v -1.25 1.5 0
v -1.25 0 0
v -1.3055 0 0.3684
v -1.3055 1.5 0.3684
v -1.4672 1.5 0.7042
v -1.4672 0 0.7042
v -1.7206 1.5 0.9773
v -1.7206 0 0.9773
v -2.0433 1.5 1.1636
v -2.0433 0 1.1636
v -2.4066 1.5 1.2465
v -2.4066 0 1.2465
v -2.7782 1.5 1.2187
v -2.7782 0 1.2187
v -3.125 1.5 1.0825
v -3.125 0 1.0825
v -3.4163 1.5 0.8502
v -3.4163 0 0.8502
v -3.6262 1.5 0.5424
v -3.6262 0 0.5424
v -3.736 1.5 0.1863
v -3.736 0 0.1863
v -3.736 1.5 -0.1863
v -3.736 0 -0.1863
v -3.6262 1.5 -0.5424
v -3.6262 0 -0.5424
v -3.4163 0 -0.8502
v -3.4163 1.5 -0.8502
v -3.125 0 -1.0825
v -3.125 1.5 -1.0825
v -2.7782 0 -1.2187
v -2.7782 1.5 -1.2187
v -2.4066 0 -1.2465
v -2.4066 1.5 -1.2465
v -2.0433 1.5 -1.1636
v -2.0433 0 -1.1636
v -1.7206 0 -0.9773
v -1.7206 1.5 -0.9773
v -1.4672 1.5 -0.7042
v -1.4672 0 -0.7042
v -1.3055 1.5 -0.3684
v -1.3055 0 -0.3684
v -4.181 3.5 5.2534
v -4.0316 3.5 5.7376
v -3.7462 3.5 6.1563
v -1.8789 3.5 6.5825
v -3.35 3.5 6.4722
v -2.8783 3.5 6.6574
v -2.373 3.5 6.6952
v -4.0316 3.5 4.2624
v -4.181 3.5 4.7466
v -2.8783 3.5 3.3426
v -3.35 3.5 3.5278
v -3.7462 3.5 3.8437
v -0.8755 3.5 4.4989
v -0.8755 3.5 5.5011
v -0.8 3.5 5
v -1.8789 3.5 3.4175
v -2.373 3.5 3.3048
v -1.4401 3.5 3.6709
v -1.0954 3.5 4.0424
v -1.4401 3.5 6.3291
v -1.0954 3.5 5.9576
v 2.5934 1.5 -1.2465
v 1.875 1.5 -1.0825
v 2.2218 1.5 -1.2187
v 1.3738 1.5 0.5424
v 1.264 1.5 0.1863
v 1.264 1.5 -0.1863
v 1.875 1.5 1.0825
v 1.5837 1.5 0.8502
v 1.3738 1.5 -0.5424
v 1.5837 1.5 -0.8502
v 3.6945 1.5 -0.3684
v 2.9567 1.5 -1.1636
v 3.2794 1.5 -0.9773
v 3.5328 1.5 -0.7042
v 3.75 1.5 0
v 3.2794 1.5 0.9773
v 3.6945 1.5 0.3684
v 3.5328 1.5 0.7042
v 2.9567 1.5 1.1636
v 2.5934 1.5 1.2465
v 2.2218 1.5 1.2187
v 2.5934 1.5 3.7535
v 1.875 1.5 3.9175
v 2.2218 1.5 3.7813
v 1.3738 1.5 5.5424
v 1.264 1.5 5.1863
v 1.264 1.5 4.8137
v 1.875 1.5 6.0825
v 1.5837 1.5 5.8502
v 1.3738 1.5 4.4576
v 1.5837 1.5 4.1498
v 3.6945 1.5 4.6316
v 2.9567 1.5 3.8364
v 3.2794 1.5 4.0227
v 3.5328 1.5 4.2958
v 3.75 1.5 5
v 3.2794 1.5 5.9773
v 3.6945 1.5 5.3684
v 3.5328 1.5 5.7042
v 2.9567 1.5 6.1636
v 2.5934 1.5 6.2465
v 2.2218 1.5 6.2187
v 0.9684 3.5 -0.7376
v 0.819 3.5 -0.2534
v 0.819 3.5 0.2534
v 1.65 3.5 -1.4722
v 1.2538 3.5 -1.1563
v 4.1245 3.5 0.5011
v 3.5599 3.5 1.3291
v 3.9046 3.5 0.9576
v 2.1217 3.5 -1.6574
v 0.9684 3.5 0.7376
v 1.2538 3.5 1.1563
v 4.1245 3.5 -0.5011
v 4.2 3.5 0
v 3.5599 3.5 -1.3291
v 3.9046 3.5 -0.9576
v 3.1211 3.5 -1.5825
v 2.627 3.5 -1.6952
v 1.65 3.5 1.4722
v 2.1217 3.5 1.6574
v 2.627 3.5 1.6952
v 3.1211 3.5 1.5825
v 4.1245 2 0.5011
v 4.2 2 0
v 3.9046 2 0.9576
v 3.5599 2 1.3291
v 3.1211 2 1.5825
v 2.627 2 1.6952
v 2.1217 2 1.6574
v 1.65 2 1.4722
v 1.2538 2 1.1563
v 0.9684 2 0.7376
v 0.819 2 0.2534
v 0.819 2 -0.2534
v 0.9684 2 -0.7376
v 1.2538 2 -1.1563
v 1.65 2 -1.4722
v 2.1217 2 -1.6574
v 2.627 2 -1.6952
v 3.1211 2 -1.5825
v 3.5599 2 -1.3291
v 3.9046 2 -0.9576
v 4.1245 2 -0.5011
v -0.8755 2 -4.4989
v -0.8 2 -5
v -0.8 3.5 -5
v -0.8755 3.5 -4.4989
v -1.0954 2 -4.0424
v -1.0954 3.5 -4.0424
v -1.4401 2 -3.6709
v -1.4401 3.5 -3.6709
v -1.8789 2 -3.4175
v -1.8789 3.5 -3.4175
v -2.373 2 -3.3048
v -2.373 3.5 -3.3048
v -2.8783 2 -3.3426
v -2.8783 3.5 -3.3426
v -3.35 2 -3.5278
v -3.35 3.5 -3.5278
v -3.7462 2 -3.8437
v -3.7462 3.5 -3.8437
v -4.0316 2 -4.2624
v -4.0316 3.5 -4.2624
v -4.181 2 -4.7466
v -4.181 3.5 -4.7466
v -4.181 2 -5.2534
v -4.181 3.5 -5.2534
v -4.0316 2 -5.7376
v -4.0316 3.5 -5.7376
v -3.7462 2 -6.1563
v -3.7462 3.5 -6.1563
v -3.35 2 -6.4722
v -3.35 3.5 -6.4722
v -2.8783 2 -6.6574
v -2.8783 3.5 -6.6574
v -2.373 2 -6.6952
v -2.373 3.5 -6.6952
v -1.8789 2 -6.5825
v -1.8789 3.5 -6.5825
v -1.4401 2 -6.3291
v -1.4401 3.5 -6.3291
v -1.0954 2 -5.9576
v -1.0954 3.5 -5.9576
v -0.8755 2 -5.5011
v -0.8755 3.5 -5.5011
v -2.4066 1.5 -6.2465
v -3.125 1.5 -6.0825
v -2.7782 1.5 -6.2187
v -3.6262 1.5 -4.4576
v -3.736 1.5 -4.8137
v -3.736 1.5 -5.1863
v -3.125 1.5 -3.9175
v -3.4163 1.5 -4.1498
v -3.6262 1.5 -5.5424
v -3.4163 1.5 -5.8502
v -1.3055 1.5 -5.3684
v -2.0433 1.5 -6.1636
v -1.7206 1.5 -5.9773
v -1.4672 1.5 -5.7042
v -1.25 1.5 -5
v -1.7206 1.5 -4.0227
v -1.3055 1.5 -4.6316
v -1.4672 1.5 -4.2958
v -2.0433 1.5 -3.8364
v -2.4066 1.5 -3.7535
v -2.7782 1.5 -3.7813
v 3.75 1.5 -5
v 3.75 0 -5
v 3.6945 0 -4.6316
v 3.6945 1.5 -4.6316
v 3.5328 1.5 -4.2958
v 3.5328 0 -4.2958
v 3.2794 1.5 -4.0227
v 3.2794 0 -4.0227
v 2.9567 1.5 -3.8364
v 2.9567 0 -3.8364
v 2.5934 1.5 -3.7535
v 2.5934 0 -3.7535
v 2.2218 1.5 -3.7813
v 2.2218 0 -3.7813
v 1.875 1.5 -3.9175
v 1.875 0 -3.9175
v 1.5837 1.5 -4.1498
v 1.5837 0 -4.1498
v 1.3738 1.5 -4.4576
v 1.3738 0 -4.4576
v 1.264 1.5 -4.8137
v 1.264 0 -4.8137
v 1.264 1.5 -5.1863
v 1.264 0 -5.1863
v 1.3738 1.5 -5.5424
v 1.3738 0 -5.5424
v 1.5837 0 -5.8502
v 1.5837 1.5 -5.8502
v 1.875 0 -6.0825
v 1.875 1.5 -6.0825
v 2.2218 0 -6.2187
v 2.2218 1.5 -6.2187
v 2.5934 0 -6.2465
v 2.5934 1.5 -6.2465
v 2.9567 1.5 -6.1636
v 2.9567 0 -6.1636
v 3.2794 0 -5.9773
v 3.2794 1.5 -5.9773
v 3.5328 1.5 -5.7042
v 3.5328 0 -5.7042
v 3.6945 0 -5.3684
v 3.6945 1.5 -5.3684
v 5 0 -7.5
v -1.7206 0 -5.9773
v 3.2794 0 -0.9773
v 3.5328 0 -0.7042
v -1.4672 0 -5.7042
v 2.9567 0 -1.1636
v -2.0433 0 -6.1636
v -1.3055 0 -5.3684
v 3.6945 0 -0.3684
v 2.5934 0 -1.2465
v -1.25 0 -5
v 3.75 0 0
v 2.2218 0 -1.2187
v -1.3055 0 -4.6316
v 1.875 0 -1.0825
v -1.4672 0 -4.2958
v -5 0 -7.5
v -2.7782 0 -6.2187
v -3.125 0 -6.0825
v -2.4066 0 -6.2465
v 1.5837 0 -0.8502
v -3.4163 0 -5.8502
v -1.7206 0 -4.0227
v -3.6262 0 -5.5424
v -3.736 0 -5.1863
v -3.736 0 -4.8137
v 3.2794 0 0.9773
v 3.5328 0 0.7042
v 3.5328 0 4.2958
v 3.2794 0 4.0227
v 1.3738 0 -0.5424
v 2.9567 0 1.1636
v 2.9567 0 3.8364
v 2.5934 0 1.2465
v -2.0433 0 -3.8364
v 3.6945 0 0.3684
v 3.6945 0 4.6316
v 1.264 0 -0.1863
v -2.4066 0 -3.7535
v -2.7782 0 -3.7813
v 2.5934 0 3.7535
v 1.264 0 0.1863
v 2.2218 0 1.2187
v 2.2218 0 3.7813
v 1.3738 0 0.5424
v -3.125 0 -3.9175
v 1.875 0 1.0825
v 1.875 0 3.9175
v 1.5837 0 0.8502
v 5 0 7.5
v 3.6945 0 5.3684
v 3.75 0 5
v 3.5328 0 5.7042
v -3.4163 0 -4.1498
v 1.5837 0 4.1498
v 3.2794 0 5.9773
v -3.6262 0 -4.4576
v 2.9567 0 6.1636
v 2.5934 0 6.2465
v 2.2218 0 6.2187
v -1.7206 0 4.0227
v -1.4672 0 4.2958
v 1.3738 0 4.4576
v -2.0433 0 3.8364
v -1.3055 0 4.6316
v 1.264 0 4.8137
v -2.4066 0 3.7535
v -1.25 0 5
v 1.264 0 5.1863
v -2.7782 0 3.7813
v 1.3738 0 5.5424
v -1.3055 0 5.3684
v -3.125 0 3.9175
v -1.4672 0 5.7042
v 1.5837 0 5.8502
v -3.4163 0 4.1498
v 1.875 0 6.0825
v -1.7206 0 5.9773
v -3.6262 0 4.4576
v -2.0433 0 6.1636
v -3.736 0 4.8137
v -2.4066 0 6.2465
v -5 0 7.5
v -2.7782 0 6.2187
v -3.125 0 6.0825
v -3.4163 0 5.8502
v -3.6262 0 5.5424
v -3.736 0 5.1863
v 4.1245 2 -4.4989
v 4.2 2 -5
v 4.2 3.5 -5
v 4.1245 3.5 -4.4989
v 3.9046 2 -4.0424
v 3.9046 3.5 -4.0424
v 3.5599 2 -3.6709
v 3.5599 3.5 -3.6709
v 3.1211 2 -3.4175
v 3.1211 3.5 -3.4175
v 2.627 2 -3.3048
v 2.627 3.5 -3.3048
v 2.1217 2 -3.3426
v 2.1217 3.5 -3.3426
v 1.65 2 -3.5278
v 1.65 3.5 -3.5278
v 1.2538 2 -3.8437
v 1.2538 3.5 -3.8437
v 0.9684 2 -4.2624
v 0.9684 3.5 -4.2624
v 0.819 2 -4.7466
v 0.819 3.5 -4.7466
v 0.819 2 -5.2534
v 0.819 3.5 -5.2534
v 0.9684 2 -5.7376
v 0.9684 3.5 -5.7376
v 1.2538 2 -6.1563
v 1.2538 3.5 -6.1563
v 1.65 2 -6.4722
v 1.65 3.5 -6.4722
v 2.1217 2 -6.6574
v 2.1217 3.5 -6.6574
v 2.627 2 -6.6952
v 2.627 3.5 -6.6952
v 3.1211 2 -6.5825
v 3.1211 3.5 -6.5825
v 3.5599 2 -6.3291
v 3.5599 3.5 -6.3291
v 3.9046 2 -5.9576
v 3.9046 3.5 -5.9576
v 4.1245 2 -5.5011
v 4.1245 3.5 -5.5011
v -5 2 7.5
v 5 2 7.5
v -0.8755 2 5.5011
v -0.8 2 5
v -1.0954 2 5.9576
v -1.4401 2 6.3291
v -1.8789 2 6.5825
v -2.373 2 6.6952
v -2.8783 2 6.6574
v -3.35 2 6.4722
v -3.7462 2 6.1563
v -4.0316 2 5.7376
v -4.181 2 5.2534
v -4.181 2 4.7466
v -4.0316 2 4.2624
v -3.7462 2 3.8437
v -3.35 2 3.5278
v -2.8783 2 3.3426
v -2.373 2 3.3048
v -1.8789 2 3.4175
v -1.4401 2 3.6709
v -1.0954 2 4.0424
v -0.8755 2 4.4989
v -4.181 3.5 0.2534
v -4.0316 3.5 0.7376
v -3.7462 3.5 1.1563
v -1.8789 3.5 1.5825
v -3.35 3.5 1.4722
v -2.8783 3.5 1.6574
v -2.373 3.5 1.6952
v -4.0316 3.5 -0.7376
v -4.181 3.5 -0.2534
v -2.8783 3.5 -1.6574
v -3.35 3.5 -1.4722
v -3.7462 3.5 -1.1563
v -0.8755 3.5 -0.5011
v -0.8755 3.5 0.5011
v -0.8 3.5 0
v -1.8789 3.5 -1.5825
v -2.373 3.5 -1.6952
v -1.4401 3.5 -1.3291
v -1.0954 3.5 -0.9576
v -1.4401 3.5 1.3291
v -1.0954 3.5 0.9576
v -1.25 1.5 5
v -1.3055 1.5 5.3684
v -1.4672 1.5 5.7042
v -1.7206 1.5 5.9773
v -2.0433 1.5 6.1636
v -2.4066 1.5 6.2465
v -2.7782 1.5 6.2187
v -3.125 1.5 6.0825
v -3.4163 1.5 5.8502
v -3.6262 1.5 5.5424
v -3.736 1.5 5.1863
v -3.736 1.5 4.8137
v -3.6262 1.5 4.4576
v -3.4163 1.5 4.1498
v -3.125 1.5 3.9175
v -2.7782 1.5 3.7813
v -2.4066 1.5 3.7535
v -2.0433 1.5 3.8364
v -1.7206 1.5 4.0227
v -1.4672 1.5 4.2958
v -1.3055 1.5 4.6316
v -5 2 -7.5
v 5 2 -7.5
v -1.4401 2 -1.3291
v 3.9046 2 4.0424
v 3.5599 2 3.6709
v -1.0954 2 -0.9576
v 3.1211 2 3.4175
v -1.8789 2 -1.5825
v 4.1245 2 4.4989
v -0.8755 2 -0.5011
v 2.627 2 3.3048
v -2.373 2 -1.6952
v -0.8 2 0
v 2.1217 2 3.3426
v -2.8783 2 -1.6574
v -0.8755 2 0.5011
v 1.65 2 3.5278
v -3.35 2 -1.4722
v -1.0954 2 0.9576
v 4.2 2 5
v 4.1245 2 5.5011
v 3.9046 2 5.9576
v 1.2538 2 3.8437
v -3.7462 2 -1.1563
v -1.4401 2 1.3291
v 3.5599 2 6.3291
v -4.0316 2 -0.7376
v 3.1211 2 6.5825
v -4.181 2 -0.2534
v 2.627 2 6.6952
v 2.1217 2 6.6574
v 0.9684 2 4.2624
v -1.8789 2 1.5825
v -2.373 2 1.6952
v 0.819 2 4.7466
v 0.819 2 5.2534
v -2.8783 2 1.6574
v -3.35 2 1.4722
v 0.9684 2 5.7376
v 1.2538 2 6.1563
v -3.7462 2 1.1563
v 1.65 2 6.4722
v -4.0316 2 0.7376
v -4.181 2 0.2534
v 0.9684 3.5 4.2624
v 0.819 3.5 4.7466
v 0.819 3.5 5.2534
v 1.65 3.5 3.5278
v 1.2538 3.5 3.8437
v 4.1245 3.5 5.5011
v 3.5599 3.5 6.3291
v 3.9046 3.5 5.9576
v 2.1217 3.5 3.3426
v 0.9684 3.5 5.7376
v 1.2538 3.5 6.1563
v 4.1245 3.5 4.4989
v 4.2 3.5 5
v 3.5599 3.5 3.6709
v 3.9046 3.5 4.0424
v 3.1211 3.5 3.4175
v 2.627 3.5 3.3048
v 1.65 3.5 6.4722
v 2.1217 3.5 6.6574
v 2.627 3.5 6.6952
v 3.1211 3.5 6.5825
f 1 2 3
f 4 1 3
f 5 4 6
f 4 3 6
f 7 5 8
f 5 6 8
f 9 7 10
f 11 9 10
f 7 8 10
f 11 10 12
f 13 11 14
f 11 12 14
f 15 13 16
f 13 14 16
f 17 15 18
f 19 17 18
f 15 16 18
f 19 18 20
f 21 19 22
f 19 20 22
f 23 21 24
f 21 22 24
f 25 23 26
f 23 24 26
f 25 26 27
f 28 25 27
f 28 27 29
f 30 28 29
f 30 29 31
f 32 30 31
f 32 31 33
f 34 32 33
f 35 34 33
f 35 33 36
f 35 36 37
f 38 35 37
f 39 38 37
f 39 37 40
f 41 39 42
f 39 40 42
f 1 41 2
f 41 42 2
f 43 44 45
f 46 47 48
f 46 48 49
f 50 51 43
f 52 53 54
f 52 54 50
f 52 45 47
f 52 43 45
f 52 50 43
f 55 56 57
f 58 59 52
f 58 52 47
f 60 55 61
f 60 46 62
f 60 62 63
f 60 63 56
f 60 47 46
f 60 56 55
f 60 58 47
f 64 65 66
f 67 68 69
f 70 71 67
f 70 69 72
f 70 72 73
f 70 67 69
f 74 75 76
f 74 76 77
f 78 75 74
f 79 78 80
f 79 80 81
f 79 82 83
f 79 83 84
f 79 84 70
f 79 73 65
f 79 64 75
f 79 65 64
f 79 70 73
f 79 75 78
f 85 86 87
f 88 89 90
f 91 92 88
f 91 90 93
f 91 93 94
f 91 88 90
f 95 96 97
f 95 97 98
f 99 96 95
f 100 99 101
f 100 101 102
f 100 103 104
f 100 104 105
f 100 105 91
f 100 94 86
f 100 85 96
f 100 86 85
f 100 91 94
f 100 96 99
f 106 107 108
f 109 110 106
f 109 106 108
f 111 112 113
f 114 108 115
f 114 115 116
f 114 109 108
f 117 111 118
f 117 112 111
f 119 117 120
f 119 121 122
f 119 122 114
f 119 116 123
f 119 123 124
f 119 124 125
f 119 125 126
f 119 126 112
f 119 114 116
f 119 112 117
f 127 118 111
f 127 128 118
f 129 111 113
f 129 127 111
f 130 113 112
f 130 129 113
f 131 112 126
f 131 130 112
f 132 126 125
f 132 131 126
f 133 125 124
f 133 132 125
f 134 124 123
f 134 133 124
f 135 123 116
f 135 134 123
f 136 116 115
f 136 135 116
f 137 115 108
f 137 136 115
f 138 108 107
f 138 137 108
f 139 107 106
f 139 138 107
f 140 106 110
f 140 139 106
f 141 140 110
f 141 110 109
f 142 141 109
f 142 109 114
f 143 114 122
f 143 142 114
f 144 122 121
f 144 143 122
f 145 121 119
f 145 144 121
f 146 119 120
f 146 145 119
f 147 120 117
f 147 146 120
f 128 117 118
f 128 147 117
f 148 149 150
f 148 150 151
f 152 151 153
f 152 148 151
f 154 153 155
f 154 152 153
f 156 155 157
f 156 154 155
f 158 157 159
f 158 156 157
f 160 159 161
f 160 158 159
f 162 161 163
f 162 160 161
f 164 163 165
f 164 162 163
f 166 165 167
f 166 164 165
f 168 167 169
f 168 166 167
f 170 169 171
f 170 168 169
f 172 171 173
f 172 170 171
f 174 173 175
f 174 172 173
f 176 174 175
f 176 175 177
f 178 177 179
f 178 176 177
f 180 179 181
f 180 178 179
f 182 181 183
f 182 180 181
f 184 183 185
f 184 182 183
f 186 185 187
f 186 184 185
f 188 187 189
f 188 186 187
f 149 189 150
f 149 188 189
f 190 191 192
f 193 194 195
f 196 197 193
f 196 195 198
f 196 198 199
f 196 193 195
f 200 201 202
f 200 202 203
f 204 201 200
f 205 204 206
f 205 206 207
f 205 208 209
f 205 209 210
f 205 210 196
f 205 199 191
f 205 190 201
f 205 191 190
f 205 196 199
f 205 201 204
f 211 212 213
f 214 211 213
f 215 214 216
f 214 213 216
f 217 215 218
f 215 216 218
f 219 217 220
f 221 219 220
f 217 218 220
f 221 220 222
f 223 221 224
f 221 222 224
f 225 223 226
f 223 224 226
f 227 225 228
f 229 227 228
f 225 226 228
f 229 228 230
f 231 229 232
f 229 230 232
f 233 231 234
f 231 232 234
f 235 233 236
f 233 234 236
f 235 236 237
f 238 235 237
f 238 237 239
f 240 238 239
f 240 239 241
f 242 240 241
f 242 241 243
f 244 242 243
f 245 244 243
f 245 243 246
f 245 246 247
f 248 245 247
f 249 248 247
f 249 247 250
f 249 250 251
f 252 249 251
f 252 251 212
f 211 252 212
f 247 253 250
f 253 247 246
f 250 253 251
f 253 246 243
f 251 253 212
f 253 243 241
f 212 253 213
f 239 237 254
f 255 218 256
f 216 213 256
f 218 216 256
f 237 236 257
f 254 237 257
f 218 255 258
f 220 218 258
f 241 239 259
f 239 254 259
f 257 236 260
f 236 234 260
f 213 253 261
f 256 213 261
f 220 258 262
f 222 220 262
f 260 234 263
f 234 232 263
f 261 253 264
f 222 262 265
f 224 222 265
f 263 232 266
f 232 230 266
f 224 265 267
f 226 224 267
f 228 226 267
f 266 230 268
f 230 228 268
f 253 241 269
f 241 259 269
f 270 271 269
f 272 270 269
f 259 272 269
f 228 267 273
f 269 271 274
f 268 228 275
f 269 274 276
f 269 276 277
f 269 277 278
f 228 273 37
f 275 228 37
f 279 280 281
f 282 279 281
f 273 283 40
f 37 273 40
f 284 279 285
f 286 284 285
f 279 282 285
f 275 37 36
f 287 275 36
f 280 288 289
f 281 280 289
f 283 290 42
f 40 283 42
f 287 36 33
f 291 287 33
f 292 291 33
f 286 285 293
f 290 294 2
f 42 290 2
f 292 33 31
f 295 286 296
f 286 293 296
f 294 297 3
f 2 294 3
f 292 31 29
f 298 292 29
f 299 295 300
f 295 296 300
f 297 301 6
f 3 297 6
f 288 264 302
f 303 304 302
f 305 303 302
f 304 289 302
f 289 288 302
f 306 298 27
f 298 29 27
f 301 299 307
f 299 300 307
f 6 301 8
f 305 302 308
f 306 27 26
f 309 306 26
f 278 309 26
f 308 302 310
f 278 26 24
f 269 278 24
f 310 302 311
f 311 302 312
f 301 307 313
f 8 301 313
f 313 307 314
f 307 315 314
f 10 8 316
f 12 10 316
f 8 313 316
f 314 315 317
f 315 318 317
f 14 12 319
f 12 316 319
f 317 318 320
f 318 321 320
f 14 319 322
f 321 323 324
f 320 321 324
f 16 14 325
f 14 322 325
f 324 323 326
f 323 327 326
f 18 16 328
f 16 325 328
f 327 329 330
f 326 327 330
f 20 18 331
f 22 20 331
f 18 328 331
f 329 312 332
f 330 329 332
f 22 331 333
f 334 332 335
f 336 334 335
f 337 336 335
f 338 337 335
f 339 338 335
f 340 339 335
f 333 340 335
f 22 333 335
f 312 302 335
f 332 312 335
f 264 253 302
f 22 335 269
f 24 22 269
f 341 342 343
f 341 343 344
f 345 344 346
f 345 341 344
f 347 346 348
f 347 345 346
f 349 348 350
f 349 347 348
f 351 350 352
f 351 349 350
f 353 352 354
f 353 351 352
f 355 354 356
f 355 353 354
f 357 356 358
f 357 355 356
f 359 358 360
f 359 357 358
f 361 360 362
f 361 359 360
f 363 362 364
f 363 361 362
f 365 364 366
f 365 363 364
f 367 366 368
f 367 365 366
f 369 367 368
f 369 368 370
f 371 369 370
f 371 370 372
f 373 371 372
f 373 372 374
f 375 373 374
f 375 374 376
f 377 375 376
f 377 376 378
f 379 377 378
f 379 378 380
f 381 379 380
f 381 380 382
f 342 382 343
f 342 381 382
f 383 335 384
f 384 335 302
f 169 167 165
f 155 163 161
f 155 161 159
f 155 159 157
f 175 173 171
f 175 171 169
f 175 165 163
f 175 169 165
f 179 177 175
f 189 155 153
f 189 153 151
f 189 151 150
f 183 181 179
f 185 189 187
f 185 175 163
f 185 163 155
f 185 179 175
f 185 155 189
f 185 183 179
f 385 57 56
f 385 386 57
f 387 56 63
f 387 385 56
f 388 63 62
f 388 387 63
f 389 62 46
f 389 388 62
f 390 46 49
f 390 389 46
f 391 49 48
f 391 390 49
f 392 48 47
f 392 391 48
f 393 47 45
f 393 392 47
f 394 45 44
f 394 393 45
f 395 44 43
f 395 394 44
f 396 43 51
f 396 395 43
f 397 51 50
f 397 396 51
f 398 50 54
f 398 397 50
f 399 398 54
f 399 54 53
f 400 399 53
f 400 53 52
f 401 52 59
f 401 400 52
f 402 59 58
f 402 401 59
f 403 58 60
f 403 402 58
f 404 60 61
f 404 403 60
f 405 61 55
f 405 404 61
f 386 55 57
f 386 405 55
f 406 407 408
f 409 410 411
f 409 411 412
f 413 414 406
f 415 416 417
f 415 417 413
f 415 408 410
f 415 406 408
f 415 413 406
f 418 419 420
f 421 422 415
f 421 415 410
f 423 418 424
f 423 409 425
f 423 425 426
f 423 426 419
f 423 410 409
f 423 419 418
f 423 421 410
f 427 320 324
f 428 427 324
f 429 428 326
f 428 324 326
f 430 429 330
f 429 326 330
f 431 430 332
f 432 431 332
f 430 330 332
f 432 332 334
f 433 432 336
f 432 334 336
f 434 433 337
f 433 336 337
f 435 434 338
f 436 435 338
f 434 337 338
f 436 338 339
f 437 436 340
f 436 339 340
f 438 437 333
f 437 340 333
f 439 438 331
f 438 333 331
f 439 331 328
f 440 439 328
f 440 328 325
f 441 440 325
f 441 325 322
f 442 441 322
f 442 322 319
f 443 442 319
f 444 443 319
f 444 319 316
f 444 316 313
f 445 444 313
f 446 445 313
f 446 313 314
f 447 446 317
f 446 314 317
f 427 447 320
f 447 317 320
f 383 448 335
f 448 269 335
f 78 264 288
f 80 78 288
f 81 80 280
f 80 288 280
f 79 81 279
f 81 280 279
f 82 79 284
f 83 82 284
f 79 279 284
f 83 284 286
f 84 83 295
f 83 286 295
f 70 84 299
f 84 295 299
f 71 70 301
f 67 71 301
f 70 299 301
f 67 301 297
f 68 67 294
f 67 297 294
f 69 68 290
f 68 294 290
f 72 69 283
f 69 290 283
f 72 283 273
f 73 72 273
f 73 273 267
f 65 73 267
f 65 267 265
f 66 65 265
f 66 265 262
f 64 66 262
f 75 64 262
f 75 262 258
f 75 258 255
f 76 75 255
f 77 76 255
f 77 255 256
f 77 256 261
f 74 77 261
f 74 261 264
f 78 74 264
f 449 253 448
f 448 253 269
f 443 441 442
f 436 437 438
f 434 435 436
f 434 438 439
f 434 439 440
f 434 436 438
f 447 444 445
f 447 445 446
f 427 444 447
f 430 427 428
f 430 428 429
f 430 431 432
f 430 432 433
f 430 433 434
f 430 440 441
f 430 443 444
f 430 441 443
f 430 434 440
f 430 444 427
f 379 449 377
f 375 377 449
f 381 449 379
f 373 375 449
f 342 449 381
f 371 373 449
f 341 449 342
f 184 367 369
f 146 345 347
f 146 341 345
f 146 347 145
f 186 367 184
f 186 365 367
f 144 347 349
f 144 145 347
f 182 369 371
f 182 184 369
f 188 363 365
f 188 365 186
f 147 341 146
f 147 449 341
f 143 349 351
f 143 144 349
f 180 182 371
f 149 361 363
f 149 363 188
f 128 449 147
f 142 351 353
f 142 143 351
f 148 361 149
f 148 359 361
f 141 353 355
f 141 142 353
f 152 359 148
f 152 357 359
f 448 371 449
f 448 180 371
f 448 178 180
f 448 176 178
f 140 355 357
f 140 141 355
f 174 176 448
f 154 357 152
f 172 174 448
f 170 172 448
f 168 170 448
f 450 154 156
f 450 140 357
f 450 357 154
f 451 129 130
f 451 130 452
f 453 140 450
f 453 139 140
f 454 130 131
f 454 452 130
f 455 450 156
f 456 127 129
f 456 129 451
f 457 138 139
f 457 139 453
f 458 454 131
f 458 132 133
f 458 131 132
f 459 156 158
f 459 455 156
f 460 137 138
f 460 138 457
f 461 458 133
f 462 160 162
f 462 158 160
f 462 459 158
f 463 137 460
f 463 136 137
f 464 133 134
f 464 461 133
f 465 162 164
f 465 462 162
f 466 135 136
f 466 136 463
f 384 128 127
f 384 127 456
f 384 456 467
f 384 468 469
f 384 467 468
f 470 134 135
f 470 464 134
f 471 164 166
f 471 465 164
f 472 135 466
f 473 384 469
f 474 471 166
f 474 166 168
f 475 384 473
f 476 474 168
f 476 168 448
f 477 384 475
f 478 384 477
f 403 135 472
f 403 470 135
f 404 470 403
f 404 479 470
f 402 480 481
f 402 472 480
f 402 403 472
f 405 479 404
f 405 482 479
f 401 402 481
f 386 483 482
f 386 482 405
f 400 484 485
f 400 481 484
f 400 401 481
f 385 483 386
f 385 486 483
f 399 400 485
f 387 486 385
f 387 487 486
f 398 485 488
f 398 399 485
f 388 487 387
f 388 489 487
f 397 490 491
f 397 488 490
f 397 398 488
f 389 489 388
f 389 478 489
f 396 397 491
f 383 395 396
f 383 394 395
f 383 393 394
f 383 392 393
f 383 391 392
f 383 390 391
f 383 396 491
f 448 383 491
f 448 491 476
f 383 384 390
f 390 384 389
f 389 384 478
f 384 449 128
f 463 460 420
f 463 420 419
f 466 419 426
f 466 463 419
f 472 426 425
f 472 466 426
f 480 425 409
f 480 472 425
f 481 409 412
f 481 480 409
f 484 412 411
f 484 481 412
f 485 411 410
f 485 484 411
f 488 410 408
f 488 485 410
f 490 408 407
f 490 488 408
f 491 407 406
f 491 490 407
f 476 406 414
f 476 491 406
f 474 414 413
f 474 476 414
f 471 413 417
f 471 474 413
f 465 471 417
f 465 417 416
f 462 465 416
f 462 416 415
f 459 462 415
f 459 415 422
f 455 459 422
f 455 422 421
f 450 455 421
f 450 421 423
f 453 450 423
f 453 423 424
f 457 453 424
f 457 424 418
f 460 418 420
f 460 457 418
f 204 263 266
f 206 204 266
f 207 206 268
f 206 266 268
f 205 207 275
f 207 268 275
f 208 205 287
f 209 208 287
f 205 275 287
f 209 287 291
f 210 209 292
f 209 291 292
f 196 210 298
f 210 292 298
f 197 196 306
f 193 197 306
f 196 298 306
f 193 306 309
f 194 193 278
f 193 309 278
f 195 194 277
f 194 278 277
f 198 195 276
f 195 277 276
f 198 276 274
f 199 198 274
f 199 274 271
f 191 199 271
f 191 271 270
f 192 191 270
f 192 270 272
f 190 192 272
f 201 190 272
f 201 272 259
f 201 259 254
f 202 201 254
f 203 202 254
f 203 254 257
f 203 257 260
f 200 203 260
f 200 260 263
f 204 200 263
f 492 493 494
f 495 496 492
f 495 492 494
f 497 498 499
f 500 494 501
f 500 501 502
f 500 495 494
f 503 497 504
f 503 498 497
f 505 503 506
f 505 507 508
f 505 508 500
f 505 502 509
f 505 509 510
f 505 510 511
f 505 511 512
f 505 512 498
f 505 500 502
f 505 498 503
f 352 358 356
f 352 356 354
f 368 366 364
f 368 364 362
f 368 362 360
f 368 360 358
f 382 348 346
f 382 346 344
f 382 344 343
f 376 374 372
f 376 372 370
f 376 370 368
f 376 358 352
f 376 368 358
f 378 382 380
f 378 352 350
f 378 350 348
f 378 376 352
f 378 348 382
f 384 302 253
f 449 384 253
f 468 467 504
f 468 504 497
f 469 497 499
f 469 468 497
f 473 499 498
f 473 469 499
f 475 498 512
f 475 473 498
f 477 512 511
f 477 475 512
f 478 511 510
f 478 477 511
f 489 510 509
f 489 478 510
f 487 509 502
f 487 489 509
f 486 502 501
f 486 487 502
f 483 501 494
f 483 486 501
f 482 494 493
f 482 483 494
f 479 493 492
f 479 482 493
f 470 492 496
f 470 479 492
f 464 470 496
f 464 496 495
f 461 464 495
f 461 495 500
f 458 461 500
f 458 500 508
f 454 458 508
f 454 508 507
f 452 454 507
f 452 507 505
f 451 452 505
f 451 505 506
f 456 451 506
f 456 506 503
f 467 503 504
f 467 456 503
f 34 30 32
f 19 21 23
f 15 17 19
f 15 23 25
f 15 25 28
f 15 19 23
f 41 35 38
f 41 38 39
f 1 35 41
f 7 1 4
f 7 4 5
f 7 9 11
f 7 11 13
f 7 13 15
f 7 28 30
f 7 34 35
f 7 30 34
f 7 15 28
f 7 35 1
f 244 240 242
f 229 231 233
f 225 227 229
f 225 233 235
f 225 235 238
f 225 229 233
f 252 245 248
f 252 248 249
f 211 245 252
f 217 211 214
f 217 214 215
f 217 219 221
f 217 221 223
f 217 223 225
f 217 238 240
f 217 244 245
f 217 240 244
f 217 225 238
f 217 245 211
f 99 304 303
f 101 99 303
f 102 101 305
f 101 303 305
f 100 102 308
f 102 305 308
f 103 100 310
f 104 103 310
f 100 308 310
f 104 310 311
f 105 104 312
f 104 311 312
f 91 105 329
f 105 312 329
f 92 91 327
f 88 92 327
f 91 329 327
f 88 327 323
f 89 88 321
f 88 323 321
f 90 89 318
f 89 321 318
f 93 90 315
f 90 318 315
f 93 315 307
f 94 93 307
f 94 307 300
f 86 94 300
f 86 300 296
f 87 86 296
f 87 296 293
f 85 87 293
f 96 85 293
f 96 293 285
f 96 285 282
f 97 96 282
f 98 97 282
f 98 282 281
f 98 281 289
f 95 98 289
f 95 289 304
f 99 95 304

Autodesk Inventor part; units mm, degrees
ref_plane "YZ Plane" through (0, 0, 0) normal (1, 0, 0) x (0, 1, 0)
ref_plane "XZ Plane" through (0, 0, 0) normal (0, 1, 0) x (-1, 0, 0)
ref_plane "XY Plane" through (0, 0, 0) normal (0, 0, 1) x (1, 0, 0)
sketch "草圖1" plane through (0, 0, 0) normal (0, 1, 0) x (-1, 0, 0)
  line L0 (5, 7.5) -> (-5, 7.5)
  line L1 (-5, 7.5) -> (-5, -7.5)
  line L2 (-5, -7.5) -> (5, -7.5)
  line L3 (5, -7.5) -> (5, 7.5)
  point P0 (0, 0)
  point P1 (5, 0)
  point P2 (0, -7.5)
  dimension "d0" = 10
  dimension "d1" = 15
extrude "擠出1" add sketch "草圖1" along normal blind 2
sketch "草圖2" plane through (0, 0, 0) normal (0, -1, 0) x (1, 0, 0)
  line L0 (5, 7.5) -> (5, -7.5) projected
  line L1 (-5, 7.5) -> (5, 7.5) projected
  line L2 (-5, -7.5) -> (-5, 7.5) projected
  line L3 (5, -7.5) -> (-5, -7.5) projected
  circle A0 centre (2.5, 5) radius 1.25
  circle A1 centre (2.5, 5) radius 2.5
  point P0 (0, 0)
  dimension "d4" = 2.5
  dimension "d5" = 5
  dimension "d6" = 2.5
  dimension "d7" = 2.5
extrude "擠出2" cut sketch "草圖2" against normal blind 1.5 contours A0
pattern_linear "矩形陣列1" count 3 spacing 5 along (0, 0, -1) count 2 spacing 5 along (-1, 0, 0) of "擠出2"
sketch "草圖3" plane through (0, 2, 0) normal (0, 1, 0) x (1, 0, 0)
  circle A0 centre (2.5, -5) radius 1.7
  line L0 (5, -7.5) -> (5, 7.5) projected
  line L1 (-5, -7.5) -> (5, -7.5) projected
  point P0 (0, 0)
  dimension "d16" = 3.4
  dimension "d17" = 2.5
  dimension "d18" = 2.5
extrude "擠出3" add sketch "草圖3" along normal blind 1.5
pattern_linear "矩形陣列2" count 3 spacing 5 along (0, 0, -1) count 2 spacing 5 along (-1, 0, 0) of "擠出3"
properties part number "110033226_ipt_02_草地一"
